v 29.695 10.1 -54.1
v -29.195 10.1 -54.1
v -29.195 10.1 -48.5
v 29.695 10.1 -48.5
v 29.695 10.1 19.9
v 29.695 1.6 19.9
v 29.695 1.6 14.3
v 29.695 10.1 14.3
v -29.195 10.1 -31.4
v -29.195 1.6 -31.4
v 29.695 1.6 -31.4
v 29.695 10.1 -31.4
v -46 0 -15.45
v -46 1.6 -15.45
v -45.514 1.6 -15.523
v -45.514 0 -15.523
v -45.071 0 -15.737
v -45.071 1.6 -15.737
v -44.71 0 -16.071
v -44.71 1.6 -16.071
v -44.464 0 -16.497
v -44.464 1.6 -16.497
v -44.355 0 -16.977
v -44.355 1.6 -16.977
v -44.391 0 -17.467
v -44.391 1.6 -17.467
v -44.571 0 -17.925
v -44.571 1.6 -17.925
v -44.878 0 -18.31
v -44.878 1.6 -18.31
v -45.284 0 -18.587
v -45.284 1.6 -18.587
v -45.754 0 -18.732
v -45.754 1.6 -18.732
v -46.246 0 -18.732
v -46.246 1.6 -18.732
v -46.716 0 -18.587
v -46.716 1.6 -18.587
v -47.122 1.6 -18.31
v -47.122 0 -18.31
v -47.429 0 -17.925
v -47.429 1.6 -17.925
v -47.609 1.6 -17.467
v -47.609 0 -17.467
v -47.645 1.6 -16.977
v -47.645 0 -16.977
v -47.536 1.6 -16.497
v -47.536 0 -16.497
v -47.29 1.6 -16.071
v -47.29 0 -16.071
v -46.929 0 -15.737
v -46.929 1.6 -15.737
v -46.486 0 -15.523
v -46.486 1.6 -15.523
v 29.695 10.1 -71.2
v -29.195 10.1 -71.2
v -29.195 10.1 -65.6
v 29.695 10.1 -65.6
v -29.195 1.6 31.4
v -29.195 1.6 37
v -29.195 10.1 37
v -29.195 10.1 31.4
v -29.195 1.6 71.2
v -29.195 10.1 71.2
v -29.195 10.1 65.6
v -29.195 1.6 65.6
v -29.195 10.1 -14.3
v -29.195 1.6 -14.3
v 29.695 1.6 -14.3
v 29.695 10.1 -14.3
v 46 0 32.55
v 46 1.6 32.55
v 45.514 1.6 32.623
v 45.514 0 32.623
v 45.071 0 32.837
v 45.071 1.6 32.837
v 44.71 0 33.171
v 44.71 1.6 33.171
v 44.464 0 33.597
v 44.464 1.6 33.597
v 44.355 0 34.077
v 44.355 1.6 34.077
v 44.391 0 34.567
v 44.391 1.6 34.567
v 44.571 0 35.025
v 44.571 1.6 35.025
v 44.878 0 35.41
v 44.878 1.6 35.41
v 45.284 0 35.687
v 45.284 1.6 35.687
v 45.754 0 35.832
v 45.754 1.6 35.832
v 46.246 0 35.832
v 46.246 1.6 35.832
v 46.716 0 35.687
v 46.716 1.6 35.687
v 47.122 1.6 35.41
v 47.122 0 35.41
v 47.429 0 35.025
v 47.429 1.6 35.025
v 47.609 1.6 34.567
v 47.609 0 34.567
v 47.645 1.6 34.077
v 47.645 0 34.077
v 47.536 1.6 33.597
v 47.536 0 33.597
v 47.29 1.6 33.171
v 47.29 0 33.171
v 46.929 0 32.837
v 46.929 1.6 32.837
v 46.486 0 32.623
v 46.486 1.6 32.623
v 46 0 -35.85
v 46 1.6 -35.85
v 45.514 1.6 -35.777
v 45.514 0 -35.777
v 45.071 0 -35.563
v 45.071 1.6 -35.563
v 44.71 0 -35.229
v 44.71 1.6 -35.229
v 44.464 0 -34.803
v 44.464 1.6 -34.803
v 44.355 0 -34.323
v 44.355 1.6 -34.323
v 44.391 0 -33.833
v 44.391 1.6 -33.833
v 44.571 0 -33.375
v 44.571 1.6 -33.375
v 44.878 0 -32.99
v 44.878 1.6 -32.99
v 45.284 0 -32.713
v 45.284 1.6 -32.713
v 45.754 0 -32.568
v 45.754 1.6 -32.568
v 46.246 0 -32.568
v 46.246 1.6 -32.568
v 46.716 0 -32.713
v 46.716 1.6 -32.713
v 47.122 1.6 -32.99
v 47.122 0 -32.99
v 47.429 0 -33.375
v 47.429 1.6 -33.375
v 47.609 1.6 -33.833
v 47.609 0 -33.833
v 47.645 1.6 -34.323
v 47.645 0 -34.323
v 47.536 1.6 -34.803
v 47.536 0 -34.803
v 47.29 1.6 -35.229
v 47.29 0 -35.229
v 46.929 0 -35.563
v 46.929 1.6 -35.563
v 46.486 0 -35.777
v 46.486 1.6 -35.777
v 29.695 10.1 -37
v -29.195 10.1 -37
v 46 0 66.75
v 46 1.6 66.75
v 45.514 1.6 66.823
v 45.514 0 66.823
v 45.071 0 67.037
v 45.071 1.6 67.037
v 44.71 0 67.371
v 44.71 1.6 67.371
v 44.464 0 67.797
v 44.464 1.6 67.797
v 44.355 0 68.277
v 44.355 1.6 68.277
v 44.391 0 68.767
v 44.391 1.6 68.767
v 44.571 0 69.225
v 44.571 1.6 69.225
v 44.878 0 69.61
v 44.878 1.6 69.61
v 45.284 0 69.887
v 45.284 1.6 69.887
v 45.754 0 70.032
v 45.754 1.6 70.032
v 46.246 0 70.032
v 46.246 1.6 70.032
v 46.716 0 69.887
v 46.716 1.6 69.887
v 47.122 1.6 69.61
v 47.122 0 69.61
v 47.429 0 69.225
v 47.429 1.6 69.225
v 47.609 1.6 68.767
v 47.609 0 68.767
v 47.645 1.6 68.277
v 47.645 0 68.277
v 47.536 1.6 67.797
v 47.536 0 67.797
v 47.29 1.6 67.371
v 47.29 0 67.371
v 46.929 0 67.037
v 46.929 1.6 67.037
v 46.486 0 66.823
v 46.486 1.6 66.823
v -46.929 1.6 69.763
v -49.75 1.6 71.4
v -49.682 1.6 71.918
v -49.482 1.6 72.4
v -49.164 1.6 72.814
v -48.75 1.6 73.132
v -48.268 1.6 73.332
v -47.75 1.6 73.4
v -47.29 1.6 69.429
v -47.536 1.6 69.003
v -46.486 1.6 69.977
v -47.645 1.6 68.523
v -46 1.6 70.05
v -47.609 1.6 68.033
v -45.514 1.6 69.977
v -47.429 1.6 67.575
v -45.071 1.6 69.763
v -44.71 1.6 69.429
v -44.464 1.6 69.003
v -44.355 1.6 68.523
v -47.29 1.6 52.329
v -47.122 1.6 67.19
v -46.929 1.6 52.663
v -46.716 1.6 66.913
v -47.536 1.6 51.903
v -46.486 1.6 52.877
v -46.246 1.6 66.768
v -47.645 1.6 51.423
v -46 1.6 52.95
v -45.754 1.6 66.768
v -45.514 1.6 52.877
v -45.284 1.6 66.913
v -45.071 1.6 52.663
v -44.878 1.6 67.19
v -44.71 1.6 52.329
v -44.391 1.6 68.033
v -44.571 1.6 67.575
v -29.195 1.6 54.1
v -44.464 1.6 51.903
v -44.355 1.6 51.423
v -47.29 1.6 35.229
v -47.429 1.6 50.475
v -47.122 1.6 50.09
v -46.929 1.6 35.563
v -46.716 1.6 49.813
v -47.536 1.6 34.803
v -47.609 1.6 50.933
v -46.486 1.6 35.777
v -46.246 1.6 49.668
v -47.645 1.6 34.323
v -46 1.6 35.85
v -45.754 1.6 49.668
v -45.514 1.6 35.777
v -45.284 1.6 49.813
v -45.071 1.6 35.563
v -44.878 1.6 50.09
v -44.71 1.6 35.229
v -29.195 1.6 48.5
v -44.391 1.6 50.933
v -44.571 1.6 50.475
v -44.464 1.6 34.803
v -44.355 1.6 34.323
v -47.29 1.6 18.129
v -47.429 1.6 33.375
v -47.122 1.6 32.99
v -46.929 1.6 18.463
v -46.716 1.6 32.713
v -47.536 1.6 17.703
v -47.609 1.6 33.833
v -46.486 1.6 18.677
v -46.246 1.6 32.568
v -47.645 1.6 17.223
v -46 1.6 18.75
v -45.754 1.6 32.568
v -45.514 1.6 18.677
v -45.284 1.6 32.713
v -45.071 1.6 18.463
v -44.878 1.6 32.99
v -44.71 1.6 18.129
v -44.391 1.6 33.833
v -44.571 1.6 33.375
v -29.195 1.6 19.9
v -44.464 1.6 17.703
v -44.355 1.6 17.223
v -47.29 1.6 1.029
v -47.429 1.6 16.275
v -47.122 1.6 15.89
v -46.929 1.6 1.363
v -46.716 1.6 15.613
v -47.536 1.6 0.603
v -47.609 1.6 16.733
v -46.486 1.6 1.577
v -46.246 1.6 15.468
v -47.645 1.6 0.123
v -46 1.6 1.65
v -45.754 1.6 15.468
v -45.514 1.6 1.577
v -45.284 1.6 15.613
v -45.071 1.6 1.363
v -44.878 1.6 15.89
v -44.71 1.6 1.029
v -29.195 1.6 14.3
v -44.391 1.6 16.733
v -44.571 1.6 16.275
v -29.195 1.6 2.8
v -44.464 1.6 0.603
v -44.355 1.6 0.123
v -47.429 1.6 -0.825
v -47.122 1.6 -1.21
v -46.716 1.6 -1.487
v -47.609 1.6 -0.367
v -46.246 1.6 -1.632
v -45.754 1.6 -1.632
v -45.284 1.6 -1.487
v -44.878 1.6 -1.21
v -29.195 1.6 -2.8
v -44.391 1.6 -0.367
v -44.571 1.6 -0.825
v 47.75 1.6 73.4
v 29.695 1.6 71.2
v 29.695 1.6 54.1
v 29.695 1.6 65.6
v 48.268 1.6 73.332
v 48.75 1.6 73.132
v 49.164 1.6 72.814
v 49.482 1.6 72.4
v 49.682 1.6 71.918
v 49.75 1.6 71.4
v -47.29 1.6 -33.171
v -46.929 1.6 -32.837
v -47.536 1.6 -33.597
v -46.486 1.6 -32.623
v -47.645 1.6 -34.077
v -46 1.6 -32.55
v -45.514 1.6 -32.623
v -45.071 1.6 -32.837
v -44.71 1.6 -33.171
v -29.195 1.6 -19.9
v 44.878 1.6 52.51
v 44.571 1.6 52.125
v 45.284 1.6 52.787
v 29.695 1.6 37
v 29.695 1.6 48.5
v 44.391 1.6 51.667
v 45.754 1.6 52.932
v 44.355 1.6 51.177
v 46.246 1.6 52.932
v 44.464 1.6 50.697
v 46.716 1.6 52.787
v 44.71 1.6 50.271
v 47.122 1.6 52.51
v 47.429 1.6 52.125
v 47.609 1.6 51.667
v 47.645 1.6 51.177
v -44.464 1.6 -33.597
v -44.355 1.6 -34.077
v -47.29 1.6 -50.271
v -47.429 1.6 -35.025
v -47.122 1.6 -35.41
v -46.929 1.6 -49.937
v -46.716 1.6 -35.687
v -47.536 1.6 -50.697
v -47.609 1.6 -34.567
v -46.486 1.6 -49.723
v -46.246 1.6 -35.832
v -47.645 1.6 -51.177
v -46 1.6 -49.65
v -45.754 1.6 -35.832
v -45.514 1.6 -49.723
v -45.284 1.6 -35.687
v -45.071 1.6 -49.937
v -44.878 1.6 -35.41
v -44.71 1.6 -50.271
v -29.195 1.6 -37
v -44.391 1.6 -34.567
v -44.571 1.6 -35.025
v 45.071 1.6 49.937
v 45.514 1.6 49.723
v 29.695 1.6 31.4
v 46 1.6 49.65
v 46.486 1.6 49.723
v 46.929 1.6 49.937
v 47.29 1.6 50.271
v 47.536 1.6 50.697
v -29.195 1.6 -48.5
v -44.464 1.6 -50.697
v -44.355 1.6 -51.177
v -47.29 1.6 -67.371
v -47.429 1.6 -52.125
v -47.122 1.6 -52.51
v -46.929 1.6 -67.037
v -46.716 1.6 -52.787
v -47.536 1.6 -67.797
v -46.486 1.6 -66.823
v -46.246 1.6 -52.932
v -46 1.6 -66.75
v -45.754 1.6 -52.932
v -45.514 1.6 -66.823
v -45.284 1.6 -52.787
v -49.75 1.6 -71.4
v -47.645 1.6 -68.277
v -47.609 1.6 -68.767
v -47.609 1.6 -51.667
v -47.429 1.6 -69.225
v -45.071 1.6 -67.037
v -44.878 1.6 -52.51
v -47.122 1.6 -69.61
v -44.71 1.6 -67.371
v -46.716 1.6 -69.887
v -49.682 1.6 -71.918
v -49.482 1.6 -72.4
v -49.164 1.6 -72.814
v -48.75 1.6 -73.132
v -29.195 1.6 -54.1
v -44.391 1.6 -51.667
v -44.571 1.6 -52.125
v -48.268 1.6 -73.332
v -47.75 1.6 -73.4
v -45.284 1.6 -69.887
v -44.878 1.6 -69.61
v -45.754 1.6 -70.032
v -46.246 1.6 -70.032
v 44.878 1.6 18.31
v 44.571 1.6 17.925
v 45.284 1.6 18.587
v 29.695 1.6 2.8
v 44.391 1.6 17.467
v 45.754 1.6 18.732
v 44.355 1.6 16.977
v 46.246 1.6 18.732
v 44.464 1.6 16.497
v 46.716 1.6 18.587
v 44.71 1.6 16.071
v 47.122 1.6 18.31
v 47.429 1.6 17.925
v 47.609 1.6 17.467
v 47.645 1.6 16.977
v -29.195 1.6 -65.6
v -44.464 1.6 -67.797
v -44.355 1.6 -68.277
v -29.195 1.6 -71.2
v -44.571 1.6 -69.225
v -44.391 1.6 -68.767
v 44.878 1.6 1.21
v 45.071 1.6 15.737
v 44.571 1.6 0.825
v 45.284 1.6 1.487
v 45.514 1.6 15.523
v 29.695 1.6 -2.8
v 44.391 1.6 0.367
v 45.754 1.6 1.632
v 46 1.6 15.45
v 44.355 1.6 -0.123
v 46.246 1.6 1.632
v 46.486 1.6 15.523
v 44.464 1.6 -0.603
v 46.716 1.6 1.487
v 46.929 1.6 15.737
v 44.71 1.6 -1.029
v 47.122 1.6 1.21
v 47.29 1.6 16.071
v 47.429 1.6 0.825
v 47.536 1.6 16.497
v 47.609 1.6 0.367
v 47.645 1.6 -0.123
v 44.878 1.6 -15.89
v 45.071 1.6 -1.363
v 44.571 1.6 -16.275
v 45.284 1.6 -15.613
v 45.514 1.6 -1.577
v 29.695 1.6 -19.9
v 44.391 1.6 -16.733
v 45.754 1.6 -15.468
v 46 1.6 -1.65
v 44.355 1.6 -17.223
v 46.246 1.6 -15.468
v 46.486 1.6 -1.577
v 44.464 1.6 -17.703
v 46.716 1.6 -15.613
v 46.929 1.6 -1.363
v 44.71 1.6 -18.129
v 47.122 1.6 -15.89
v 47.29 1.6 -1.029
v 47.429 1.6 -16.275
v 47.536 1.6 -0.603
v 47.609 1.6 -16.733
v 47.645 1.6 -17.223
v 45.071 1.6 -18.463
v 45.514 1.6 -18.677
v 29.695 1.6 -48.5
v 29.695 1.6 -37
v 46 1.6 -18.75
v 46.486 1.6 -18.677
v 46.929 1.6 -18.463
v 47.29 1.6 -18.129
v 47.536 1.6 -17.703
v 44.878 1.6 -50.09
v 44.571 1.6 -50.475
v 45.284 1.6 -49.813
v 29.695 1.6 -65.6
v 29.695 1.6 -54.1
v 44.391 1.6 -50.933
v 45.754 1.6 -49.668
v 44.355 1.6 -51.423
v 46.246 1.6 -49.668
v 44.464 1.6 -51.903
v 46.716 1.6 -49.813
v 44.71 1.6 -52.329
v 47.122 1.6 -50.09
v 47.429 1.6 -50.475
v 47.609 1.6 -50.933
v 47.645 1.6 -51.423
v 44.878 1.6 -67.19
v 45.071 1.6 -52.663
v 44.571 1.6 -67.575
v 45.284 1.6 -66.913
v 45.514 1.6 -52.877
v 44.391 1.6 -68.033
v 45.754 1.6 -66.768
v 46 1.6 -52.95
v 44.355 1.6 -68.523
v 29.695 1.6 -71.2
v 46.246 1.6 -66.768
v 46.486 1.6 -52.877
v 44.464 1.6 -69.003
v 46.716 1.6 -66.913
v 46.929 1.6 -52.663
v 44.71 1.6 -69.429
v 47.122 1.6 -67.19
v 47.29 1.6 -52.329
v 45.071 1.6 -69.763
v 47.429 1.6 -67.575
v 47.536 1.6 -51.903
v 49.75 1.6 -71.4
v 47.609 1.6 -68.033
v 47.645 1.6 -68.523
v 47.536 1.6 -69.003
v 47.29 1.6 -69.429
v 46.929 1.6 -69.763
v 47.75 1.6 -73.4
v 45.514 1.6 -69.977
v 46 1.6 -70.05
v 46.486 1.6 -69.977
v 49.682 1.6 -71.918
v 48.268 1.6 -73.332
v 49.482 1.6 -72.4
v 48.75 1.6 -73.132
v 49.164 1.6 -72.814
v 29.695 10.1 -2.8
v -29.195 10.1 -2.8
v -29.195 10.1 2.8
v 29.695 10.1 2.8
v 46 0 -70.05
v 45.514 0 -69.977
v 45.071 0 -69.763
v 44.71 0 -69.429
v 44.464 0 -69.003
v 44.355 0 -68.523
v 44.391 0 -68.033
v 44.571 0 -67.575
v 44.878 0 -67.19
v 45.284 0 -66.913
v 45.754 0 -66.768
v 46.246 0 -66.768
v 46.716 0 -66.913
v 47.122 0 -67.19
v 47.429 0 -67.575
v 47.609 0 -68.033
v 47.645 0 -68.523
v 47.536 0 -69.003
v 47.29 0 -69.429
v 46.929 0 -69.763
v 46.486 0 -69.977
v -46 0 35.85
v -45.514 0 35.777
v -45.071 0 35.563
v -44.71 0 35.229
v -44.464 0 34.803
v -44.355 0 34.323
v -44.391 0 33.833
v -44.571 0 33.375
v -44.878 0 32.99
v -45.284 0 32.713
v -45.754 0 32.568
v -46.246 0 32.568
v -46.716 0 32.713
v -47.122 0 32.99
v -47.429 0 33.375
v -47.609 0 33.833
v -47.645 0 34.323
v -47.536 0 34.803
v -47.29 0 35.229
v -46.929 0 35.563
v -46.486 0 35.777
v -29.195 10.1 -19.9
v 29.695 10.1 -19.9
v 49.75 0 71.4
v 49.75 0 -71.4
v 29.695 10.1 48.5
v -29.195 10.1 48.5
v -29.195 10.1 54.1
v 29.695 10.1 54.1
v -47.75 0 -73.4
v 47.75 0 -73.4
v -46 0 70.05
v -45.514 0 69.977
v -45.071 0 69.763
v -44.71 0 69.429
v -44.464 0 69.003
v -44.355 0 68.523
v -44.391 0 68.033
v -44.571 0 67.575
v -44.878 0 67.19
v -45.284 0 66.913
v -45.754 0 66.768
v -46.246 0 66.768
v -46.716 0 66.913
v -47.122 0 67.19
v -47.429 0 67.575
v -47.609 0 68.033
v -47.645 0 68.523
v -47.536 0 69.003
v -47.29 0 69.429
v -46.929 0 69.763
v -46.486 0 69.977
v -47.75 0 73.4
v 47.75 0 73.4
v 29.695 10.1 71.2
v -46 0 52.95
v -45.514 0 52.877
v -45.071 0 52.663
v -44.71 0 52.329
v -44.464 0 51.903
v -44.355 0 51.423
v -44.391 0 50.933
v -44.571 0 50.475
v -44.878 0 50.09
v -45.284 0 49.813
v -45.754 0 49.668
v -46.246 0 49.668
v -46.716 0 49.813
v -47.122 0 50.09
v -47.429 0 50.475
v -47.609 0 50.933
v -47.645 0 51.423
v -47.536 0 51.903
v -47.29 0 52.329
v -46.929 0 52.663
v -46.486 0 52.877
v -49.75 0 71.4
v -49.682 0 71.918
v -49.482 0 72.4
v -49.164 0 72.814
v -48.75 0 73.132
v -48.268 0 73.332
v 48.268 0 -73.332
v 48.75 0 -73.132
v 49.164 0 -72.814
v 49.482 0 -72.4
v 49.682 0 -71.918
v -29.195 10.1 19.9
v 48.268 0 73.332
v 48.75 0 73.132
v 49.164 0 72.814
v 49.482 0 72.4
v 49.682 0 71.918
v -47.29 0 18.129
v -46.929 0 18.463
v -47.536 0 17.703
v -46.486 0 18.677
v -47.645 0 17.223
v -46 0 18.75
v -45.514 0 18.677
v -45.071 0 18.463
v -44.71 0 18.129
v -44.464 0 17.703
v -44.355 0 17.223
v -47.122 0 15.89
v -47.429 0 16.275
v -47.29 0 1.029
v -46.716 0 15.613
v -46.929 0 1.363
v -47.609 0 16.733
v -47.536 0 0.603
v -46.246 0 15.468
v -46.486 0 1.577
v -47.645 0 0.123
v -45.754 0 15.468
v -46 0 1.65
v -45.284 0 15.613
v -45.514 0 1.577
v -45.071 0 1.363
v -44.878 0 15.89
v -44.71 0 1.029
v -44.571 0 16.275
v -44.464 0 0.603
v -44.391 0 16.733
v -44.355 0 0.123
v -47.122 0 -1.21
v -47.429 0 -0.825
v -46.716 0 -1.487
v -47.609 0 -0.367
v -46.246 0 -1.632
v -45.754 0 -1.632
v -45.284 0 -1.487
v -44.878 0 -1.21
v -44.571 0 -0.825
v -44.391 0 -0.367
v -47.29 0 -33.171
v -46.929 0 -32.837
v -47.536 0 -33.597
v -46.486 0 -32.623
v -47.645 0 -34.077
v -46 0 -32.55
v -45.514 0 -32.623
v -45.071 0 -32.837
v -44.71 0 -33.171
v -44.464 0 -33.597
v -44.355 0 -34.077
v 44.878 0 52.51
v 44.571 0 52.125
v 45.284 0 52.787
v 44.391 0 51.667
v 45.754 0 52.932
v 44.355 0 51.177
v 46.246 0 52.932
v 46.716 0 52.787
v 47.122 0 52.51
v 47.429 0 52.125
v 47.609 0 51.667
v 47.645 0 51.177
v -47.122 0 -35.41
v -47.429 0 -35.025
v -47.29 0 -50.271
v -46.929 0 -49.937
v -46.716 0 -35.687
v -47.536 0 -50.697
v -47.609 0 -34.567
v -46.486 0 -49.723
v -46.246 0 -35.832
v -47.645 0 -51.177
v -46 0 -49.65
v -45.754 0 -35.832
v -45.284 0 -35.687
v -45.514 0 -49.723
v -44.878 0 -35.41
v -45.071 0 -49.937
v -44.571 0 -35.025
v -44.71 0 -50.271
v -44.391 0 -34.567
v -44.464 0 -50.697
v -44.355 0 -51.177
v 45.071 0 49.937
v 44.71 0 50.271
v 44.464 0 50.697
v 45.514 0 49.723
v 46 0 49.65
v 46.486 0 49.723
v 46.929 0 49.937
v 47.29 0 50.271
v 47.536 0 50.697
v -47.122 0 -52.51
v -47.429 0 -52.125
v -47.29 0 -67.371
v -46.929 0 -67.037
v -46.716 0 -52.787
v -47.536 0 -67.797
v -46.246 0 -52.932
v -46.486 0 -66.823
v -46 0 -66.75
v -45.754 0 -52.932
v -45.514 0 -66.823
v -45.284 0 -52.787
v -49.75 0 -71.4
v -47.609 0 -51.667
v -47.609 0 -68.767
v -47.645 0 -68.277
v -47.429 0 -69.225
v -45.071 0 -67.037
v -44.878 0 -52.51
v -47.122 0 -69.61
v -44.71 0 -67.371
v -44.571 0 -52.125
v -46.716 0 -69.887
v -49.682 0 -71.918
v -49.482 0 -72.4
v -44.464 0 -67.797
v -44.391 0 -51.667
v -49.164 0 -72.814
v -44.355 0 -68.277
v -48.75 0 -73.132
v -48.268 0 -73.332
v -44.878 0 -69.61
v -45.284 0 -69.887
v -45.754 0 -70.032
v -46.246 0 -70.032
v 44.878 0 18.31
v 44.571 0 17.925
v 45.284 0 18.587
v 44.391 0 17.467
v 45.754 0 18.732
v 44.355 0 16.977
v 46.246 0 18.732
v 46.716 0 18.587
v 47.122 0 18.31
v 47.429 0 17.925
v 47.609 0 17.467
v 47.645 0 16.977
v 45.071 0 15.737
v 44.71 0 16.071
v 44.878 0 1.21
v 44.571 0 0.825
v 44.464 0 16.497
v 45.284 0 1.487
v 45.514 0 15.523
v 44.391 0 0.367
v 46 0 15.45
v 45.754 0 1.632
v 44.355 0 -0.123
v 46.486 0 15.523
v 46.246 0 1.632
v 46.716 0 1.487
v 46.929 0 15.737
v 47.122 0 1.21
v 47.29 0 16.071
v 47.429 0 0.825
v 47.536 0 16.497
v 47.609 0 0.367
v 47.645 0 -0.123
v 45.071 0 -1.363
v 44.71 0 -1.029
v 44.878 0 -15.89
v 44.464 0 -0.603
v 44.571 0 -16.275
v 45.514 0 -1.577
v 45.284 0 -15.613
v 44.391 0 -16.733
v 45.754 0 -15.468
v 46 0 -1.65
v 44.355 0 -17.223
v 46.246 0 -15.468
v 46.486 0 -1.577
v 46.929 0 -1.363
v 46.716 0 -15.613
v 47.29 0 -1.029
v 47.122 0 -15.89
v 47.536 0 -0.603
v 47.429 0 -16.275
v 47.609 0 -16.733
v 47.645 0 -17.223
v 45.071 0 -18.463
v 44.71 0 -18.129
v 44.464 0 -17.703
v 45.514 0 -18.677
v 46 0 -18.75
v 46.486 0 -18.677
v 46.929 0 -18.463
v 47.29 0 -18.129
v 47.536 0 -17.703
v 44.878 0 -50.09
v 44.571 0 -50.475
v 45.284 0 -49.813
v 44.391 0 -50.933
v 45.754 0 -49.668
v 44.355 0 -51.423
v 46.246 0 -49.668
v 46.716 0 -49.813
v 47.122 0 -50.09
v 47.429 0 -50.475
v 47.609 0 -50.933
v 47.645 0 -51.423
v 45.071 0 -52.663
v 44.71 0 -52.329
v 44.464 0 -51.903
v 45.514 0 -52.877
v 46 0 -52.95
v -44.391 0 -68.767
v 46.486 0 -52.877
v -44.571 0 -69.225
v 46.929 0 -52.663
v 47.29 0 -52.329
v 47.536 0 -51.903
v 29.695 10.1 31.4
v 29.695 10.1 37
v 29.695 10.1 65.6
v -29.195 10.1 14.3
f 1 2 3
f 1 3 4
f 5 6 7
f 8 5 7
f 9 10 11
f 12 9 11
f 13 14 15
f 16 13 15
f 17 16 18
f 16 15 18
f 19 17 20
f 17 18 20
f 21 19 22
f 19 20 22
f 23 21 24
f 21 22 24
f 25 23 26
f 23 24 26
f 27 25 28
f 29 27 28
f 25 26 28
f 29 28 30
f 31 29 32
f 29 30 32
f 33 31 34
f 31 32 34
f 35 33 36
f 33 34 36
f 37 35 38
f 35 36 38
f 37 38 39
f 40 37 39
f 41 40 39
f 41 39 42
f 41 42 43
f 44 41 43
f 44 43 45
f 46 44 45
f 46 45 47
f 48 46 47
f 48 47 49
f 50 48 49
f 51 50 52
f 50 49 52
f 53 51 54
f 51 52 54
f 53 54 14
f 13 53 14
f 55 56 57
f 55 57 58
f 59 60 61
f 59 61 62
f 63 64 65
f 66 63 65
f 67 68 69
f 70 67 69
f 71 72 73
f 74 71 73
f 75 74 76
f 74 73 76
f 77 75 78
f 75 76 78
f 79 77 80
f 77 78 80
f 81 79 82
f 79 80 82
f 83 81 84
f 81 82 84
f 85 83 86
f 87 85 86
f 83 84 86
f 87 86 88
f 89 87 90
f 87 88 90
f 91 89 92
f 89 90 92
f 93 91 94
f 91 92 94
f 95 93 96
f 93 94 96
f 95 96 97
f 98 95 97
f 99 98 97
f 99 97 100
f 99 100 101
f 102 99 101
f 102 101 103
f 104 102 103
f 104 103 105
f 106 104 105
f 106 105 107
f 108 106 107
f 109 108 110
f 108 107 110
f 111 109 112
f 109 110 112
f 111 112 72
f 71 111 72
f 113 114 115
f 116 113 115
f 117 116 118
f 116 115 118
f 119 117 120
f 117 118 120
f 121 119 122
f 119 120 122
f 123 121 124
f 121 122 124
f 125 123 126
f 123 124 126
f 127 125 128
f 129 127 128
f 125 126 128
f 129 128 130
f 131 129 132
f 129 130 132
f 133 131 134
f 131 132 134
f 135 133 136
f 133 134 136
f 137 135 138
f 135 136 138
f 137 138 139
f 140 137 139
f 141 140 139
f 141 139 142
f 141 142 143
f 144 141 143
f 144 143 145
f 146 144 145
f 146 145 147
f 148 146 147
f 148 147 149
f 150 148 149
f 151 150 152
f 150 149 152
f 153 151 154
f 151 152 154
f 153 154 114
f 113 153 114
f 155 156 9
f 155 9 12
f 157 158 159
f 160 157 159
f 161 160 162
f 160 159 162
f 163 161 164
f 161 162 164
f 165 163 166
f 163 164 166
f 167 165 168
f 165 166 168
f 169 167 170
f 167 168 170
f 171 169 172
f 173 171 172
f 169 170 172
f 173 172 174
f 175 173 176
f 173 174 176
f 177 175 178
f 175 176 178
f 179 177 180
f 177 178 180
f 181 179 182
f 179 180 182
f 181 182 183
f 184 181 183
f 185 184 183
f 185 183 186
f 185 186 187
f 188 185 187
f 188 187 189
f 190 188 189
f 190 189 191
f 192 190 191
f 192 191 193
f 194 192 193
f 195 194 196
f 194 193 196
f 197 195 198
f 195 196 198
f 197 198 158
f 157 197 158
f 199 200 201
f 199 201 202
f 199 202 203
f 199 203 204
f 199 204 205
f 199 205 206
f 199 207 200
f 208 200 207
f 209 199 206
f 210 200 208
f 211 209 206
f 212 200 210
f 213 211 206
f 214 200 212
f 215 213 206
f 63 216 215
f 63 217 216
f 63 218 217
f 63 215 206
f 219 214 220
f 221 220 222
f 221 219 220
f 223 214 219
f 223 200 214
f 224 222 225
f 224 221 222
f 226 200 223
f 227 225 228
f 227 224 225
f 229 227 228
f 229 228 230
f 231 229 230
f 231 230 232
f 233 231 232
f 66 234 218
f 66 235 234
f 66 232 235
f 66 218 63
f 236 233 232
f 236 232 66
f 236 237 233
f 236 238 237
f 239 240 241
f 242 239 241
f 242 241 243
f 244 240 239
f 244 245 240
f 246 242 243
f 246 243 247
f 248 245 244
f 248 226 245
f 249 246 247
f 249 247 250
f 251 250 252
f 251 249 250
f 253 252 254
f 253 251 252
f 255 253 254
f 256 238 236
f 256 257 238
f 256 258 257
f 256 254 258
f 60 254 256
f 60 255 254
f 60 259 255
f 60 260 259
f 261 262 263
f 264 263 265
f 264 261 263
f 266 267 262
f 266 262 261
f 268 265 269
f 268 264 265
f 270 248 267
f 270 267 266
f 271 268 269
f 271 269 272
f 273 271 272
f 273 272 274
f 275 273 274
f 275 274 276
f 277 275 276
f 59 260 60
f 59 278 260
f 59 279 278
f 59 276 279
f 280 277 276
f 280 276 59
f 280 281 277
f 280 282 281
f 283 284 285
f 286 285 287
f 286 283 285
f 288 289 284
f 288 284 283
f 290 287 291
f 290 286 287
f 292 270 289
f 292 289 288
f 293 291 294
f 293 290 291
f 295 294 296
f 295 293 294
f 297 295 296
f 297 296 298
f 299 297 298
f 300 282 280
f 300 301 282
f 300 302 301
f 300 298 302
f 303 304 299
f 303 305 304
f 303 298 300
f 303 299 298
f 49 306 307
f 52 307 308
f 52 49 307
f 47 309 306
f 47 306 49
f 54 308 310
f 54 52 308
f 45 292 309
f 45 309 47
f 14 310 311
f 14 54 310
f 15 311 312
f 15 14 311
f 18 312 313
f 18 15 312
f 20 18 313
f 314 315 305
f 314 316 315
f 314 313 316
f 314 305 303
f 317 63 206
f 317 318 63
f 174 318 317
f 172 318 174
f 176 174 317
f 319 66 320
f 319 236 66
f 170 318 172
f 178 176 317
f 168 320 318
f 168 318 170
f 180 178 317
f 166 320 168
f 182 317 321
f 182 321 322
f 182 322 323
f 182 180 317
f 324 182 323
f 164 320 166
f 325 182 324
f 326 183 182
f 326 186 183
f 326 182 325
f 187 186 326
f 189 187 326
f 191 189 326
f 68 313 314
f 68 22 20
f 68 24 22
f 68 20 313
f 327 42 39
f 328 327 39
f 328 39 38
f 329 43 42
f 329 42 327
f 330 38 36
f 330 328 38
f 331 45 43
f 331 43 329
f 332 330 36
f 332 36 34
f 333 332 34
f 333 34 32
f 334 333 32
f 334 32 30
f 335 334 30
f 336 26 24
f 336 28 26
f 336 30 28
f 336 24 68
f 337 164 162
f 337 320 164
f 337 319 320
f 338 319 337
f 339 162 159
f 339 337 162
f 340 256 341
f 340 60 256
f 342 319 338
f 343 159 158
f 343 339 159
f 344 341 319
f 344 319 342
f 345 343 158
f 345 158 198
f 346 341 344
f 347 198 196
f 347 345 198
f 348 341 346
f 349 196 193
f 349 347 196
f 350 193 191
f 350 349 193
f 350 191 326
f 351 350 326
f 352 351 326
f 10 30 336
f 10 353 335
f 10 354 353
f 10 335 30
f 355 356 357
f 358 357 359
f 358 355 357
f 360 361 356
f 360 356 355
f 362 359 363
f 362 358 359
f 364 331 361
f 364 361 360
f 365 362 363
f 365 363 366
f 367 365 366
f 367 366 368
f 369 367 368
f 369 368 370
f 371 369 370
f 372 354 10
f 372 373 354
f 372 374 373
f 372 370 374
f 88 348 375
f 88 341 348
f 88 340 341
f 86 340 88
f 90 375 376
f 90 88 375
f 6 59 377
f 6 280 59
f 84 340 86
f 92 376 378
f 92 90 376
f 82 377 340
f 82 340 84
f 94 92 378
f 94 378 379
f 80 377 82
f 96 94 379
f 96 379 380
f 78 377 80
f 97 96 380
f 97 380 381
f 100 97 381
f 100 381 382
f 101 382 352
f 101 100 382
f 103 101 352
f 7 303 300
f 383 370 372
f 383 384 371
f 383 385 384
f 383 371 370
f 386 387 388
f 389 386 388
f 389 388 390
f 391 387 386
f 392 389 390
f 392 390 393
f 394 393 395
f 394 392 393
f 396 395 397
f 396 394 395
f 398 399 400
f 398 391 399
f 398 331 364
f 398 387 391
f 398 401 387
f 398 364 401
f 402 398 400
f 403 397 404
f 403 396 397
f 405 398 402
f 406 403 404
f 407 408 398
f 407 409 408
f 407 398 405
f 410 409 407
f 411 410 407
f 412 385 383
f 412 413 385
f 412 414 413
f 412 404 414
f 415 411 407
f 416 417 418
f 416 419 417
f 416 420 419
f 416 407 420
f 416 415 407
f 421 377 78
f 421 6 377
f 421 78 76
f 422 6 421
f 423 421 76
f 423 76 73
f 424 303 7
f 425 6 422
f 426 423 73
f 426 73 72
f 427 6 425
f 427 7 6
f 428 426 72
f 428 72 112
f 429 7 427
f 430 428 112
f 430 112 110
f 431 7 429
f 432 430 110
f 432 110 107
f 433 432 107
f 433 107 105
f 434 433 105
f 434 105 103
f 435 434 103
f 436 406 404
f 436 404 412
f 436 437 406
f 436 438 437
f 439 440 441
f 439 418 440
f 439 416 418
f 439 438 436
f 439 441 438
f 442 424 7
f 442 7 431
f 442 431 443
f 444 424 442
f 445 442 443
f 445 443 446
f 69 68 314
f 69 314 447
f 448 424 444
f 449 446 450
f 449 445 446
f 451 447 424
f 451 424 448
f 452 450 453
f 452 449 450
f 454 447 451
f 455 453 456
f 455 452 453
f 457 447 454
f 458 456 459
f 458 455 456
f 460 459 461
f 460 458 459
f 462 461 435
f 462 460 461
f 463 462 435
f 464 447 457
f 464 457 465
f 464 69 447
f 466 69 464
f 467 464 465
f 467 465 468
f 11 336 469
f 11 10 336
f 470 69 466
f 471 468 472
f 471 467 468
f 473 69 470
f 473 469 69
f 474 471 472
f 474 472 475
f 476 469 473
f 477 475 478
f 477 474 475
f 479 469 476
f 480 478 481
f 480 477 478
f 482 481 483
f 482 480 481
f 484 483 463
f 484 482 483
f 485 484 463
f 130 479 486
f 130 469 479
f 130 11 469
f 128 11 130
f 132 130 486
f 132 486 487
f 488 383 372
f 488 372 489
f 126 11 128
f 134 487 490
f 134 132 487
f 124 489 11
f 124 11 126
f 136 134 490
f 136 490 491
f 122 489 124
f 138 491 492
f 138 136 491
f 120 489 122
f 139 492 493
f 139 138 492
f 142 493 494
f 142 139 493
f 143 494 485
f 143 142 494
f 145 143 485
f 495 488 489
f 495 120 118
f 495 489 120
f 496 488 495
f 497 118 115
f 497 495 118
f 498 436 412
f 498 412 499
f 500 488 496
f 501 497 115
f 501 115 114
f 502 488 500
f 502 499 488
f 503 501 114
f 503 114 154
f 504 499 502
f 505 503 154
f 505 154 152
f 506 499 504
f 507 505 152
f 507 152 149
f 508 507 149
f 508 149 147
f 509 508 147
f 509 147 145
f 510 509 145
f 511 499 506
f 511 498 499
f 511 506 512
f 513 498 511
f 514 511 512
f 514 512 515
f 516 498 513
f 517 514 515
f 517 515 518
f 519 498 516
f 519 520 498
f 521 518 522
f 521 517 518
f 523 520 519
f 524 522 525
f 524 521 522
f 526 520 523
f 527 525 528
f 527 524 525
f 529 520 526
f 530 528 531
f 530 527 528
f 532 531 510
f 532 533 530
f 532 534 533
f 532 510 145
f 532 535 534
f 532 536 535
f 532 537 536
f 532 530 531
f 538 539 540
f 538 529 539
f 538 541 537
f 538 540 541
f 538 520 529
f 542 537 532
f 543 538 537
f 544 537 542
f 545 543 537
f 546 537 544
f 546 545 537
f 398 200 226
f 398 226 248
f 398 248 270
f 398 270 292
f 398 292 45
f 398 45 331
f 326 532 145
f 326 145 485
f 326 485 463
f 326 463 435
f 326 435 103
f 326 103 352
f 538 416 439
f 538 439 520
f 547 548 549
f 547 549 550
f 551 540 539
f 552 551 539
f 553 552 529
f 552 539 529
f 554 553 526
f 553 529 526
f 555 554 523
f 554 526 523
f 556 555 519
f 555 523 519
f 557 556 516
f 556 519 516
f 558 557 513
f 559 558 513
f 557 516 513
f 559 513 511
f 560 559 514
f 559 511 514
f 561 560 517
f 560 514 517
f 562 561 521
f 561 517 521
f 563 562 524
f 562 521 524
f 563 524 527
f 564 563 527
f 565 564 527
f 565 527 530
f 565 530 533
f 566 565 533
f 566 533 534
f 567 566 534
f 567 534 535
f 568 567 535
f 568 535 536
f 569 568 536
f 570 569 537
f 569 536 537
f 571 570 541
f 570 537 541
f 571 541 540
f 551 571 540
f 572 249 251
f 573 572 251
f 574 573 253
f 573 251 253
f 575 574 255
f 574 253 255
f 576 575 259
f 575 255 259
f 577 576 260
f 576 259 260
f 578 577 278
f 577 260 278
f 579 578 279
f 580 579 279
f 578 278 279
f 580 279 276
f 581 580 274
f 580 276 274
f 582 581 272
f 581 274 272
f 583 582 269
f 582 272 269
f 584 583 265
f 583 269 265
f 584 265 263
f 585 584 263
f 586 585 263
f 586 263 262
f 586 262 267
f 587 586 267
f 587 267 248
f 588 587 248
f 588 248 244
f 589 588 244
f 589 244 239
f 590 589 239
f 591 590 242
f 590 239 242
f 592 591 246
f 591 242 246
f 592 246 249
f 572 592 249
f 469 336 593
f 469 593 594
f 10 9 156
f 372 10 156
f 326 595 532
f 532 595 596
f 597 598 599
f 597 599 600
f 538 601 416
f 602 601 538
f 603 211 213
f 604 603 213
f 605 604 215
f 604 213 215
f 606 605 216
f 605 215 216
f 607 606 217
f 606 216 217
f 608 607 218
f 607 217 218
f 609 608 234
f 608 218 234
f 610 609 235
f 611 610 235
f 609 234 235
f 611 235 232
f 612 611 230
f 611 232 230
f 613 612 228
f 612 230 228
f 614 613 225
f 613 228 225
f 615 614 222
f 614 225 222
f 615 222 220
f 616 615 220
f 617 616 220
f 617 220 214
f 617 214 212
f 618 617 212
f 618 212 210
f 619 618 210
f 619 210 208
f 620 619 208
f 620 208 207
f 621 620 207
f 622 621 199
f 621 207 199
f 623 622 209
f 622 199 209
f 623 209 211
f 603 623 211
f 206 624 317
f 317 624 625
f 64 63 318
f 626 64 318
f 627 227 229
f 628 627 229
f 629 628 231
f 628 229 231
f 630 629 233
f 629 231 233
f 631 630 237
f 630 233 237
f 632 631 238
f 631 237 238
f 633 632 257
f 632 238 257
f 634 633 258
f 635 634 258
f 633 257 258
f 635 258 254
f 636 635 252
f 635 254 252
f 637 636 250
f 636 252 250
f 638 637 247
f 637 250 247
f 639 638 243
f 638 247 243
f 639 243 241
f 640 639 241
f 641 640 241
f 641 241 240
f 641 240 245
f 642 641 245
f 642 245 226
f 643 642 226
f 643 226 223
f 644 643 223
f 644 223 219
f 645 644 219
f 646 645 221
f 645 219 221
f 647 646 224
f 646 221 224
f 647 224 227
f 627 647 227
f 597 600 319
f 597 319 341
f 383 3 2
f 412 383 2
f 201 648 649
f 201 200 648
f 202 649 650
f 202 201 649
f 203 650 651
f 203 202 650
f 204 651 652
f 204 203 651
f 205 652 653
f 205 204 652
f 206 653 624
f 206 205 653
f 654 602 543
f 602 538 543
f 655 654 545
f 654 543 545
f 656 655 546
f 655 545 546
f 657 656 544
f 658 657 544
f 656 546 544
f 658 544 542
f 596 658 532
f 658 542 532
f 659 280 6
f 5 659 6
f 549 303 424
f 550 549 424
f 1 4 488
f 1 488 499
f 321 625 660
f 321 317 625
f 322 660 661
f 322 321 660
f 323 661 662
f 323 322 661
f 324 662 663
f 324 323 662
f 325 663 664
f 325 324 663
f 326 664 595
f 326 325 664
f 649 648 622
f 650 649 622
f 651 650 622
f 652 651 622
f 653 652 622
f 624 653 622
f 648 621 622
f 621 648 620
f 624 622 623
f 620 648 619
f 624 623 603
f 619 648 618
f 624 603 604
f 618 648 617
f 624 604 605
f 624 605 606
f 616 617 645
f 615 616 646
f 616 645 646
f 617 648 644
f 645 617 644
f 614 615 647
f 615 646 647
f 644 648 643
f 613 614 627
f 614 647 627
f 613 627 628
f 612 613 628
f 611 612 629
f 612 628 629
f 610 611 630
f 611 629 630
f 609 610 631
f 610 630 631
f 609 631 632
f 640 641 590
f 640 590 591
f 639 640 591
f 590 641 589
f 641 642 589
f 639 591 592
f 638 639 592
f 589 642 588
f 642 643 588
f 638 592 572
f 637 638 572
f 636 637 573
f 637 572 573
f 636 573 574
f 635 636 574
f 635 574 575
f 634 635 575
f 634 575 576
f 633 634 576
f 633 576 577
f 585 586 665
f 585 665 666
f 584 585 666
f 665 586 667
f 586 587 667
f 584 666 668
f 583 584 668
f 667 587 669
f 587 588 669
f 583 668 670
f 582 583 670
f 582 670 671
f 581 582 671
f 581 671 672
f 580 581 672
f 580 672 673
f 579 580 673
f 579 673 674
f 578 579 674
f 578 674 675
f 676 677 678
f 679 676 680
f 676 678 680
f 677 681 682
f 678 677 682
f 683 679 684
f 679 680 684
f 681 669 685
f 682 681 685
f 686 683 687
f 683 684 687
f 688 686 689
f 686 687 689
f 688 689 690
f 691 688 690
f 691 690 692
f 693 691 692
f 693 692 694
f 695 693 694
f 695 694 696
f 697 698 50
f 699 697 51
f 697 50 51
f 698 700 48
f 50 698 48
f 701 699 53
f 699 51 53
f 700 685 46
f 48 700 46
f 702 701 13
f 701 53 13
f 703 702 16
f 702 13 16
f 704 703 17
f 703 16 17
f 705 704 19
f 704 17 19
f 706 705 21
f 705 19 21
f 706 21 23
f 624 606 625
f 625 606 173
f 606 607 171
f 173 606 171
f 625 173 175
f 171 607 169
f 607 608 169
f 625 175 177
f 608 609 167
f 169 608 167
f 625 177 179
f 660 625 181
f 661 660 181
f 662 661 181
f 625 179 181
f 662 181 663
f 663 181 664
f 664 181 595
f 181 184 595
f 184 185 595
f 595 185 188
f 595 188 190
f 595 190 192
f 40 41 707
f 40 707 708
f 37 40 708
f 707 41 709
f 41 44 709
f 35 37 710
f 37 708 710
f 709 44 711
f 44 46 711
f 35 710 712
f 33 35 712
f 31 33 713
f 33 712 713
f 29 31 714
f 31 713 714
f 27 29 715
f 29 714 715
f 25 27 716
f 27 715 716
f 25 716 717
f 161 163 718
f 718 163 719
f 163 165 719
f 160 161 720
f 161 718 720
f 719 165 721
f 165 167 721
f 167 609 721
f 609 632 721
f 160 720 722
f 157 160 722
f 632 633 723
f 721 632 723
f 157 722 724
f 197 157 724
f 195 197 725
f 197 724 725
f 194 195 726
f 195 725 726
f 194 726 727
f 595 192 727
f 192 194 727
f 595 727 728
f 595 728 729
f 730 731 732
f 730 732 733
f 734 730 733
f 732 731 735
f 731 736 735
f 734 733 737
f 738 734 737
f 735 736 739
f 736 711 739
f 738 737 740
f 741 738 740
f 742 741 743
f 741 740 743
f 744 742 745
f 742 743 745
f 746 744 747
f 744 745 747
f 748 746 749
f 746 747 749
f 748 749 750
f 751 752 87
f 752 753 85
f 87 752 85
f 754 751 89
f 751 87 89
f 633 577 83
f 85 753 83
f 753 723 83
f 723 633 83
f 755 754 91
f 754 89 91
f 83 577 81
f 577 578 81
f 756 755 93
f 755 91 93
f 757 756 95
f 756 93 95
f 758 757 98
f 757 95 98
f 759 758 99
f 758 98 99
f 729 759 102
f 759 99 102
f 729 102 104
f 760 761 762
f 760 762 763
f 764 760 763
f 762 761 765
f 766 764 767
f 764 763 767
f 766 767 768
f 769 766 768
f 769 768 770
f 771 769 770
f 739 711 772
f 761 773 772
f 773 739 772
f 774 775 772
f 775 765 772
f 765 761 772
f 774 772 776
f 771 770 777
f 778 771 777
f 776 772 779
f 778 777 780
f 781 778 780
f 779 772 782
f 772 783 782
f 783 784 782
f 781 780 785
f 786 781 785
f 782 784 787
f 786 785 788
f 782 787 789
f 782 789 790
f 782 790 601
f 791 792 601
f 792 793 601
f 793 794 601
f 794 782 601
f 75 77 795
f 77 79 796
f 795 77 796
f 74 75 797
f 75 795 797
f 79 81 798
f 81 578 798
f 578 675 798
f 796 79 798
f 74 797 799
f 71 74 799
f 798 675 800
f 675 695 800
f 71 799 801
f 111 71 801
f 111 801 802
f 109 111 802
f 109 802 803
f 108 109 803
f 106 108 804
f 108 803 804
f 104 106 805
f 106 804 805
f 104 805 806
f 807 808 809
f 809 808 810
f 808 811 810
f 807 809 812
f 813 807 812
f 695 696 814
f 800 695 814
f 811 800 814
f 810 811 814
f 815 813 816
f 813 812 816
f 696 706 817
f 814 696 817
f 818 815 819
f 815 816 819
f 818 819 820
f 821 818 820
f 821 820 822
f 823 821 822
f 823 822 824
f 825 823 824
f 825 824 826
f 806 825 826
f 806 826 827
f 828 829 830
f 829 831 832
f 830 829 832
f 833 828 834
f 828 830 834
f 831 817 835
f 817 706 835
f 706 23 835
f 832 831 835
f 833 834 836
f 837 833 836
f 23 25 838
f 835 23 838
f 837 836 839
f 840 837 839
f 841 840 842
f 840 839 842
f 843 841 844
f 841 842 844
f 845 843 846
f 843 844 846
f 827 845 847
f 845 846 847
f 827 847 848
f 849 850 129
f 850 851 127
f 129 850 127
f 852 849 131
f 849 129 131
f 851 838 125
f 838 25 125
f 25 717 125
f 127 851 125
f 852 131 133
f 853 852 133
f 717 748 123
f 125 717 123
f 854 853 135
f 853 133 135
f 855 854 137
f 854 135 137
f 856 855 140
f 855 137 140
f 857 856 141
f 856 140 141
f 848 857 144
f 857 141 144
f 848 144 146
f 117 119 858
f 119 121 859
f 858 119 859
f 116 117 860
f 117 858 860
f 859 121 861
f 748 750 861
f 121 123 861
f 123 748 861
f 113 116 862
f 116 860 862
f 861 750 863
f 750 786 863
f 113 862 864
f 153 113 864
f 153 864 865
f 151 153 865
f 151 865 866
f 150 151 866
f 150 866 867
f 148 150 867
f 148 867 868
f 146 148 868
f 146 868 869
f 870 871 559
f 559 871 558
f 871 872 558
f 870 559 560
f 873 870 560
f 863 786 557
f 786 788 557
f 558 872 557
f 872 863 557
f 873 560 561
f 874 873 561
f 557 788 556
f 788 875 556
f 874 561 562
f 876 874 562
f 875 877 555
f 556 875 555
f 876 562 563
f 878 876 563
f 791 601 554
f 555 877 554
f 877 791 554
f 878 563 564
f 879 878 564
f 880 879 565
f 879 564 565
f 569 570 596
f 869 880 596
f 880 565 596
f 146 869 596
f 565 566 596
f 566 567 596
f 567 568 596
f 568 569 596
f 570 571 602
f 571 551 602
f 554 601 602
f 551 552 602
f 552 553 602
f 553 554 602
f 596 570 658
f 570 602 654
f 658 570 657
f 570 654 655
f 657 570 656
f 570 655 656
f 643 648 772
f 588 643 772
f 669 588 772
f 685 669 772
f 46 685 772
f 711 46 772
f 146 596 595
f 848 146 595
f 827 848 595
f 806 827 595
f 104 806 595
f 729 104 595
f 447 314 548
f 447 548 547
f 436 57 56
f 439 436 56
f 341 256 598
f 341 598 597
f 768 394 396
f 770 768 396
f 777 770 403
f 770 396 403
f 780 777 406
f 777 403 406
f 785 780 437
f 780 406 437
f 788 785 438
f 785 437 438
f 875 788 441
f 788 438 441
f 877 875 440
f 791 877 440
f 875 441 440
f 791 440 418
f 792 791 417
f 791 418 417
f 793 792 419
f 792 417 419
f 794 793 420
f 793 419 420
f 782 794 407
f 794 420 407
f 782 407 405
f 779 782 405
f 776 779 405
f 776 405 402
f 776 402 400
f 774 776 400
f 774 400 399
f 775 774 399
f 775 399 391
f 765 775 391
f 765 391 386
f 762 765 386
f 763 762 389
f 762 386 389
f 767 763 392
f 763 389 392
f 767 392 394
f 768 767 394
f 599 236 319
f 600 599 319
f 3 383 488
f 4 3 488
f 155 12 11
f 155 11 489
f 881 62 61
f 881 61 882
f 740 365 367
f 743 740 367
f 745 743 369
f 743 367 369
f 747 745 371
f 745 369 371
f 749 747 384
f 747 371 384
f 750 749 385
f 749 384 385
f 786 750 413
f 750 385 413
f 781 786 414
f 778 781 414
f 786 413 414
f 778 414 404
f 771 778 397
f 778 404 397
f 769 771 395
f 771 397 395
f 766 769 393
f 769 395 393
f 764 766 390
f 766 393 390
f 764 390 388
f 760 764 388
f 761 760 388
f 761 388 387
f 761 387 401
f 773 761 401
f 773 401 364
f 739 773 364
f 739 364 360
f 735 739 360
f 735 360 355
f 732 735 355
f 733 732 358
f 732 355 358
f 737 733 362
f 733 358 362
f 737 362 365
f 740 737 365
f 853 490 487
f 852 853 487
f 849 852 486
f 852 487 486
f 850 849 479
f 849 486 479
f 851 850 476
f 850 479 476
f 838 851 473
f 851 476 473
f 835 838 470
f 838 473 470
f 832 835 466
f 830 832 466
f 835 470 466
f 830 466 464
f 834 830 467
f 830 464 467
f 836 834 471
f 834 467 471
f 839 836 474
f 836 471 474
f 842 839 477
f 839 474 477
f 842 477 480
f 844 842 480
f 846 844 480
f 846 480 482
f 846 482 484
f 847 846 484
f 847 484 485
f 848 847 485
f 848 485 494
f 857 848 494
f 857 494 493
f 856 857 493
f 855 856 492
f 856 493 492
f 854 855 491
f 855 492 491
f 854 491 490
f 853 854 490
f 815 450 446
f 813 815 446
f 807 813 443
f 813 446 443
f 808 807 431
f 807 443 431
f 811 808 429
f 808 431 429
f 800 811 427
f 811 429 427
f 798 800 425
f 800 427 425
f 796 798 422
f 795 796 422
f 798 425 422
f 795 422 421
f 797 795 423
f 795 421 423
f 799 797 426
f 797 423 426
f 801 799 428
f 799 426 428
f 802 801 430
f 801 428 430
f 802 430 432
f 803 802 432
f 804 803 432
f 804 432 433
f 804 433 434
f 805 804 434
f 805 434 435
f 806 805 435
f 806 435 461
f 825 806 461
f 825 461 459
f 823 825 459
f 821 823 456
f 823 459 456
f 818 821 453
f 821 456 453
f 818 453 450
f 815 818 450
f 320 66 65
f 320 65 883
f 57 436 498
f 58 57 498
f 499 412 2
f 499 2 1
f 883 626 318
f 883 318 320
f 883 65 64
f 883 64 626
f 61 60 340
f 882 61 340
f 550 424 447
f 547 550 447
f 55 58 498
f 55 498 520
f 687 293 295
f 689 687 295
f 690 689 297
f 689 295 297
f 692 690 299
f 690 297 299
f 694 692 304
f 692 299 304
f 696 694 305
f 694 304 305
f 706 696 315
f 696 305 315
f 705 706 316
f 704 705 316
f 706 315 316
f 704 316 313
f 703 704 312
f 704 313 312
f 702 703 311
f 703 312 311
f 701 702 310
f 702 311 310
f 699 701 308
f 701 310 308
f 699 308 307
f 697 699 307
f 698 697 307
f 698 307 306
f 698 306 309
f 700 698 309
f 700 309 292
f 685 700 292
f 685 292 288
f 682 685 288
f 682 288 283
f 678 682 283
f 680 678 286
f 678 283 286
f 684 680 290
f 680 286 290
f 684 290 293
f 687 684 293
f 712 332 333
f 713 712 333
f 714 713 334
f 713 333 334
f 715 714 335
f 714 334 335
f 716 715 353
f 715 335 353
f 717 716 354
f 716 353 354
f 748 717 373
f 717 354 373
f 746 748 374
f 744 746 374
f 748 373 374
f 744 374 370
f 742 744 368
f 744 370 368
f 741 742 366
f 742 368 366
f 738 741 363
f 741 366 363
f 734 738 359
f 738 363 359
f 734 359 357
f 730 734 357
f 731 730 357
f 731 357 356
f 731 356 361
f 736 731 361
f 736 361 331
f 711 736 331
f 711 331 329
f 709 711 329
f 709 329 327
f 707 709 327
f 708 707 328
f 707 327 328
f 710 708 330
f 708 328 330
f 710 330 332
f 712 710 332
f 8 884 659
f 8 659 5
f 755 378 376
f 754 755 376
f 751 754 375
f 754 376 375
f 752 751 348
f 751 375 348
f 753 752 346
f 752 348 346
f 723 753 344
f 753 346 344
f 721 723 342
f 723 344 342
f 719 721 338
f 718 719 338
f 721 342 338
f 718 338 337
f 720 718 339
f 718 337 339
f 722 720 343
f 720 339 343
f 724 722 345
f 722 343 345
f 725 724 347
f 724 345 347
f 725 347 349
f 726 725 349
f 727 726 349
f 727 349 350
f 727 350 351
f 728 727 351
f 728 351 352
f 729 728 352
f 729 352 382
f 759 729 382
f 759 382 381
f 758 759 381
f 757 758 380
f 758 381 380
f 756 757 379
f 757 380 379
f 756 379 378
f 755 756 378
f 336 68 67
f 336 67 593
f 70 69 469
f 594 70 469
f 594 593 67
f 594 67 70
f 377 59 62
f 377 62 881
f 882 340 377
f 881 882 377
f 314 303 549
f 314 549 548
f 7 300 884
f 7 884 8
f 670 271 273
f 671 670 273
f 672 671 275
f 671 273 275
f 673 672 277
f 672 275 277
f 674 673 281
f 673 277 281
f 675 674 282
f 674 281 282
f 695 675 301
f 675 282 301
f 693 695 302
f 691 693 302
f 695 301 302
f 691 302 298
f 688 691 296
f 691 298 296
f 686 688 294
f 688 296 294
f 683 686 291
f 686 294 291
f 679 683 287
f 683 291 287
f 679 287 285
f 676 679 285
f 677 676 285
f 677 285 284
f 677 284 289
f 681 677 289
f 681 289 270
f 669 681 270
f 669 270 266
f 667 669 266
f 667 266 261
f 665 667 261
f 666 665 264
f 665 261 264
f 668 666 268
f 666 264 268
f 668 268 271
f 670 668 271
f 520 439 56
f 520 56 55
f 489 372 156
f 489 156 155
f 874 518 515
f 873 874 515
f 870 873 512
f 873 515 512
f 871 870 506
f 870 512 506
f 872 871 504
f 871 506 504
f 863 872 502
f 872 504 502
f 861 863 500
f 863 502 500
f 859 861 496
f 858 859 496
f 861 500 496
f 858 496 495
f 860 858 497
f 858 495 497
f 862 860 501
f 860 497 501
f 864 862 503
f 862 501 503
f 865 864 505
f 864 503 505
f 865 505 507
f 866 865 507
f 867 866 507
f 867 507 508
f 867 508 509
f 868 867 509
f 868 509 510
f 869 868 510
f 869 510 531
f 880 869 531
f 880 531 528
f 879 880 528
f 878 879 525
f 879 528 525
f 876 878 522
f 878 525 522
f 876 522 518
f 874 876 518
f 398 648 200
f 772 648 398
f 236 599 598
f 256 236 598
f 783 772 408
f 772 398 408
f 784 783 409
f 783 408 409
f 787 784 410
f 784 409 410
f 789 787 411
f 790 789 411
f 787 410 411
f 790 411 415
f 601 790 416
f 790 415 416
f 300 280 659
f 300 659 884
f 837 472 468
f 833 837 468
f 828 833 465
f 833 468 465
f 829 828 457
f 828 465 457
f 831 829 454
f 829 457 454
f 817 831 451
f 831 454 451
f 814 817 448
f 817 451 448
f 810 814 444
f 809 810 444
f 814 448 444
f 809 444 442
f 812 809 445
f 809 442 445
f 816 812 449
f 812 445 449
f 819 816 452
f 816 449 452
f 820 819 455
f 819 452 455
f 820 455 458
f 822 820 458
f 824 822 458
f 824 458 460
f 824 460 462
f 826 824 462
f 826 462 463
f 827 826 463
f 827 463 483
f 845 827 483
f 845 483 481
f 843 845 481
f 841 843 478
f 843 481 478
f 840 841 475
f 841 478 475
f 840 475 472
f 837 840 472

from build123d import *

# Parameters (mm, degrees)
SKETCH1_W           = 99.5
SKETCH1_H           = 146.8
BOSS_EXTRUDE1_DEPTH = 1.6
SKETCH3_R           = 1.65
CUT_EXTRUDE2_DEPTH  = 1.6
SKETCH4_W           = 58.89
SKETCH4_H           = 5.6
BOSS_EXTRUDE2_DEPTH = 8.5
FILLET2_R           = 2


with BuildPart() as part:
    # Sketch1 → Boss-Extrude1 (new body)
    with BuildSketch(Plane(origin=(0, 0, 0), x_dir=(1, 0, 0), z_dir=(0, 1, 0))):
        Rectangle(SKETCH1_W, SKETCH1_H)
    extrude(amount=BOSS_EXTRUDE1_DEPTH)

    # Sketch3 → Cut-Extrude2 (cut)
    with BuildSketch(Plane(origin=(0, 1.6, 0), x_dir=(1, 0, 0), z_dir=(0, 1, 0))):
        with Locations(Location((-46, -68.4, 0), (0, 0, 270))):
            Circle(SKETCH3_R)
        with Locations(Location((-46, -51.3, 0), (0, 0, 270))):
            Circle(SKETCH3_R)
        with Locations(Location((-46, -34.2, 0), (0, 0, 270))):
            Circle(SKETCH3_R)
        with Locations(Location((-46, -17.1, 0), (0, 0, 270))):
            Circle(SKETCH3_R)
        with Locations(Location((-46, 0, 0), (0, 0, 270))):
            Circle(SKETCH3_R)
        with Locations(Location((-46, 17.1, 0), (0, 0, 270))):
            Circle(SKETCH3_R)
        with Locations(Location((-46, 34.2, 0), (0, 0, 270))):
            Circle(SKETCH3_R)
        with Locations(Location((-46, 51.3, 0), (0, 0, 270))):
            Circle(SKETCH3_R)
        with Locations(Location((-46, 68.4, 0), (0, 0, 270))):
            Circle(SKETCH3_R)
        with Locations(Location((46, 68.4, 0), (0, 0, 90))):
            Circle(SKETCH3_R)
        with Locations(Location((46, 51.3, 0), (0, 0, 90))):
            Circle(SKETCH3_R)
        with Locations(Location((46, 34.2, 0), (0, 0, 90))):
            Circle(SKETCH3_R)
        with Locations(Location((46, 17.1, 0), (0, 0, 90))):
            Circle(SKETCH3_R)
        with Locations(Location((46, 0, 0), (0, 0, 90))):
            Circle(SKETCH3_R)
        with Locations(Location((46, -17.1, 0), (0, 0, 90))):
            Circle(SKETCH3_R)
        with Locations(Location((46, -34.2, 0), (0, 0, 90))):
            Circle(SKETCH3_R)
        with Locations(Location((46, -51.3, 0), (0, 0, 90))):
            Circle(SKETCH3_R)
        with Locations(Location((46, -68.4, 0), (0, 0, 90))):
            Circle(SKETCH3_R)
    extrude(amount=-CUT_EXTRUDE2_DEPTH, mode=Mode.SUBTRACT)

    # Sketch4 → Boss-Extrude2 (add)
    with BuildSketch(Plane(origin=(0, 1.6, 0), x_dir=(1, 0, 0), z_dir=(0, 1, 0))):
        with Locations((0.25, -51.3)):
            Rectangle(SKETCH4_W, SKETCH4_H)
        with Locations((0.25, -68.4)):
            Rectangle(SKETCH4_W, SKETCH4_H)
        with Locations((0.25, -34.2)):
            Rectangle(SKETCH4_W, SKETCH4_H)
        with Locations((0.25, -17.1)):
            Rectangle(SKETCH4_W, SKETCH4_H)
        with Locations((0.25, 0)):
            Rectangle(SKETCH4_W, SKETCH4_H)
        with Locations((0.25, 17.1)):
            Rectangle(SKETCH4_W, SKETCH4_H)
        with Locations((0.25, 34.2)):
            Rectangle(SKETCH4_W, SKETCH4_H)
        with Locations((0.25, 51.3)):
            Rectangle(SKETCH4_W, SKETCH4_H)
        with Locations((0.25, 68.4)):
            Rectangle(SKETCH4_W, SKETCH4_H)
    extrude(amount=BOSS_EXTRUDE2_DEPTH)

    # Fillet2
    fillet2_edges = [part.edges().sort_by_distance(p)[0] for p in [
        (49.75, 0.8, 73.4),
        (-49.75, 0.8, 73.4),
        (-49.75, 0.8, -73.4),
        (49.75, 0.8, -73.4),
    ]]
    fillet(fillet2_edges, radius=FILLET2_R)


solid = part.part
